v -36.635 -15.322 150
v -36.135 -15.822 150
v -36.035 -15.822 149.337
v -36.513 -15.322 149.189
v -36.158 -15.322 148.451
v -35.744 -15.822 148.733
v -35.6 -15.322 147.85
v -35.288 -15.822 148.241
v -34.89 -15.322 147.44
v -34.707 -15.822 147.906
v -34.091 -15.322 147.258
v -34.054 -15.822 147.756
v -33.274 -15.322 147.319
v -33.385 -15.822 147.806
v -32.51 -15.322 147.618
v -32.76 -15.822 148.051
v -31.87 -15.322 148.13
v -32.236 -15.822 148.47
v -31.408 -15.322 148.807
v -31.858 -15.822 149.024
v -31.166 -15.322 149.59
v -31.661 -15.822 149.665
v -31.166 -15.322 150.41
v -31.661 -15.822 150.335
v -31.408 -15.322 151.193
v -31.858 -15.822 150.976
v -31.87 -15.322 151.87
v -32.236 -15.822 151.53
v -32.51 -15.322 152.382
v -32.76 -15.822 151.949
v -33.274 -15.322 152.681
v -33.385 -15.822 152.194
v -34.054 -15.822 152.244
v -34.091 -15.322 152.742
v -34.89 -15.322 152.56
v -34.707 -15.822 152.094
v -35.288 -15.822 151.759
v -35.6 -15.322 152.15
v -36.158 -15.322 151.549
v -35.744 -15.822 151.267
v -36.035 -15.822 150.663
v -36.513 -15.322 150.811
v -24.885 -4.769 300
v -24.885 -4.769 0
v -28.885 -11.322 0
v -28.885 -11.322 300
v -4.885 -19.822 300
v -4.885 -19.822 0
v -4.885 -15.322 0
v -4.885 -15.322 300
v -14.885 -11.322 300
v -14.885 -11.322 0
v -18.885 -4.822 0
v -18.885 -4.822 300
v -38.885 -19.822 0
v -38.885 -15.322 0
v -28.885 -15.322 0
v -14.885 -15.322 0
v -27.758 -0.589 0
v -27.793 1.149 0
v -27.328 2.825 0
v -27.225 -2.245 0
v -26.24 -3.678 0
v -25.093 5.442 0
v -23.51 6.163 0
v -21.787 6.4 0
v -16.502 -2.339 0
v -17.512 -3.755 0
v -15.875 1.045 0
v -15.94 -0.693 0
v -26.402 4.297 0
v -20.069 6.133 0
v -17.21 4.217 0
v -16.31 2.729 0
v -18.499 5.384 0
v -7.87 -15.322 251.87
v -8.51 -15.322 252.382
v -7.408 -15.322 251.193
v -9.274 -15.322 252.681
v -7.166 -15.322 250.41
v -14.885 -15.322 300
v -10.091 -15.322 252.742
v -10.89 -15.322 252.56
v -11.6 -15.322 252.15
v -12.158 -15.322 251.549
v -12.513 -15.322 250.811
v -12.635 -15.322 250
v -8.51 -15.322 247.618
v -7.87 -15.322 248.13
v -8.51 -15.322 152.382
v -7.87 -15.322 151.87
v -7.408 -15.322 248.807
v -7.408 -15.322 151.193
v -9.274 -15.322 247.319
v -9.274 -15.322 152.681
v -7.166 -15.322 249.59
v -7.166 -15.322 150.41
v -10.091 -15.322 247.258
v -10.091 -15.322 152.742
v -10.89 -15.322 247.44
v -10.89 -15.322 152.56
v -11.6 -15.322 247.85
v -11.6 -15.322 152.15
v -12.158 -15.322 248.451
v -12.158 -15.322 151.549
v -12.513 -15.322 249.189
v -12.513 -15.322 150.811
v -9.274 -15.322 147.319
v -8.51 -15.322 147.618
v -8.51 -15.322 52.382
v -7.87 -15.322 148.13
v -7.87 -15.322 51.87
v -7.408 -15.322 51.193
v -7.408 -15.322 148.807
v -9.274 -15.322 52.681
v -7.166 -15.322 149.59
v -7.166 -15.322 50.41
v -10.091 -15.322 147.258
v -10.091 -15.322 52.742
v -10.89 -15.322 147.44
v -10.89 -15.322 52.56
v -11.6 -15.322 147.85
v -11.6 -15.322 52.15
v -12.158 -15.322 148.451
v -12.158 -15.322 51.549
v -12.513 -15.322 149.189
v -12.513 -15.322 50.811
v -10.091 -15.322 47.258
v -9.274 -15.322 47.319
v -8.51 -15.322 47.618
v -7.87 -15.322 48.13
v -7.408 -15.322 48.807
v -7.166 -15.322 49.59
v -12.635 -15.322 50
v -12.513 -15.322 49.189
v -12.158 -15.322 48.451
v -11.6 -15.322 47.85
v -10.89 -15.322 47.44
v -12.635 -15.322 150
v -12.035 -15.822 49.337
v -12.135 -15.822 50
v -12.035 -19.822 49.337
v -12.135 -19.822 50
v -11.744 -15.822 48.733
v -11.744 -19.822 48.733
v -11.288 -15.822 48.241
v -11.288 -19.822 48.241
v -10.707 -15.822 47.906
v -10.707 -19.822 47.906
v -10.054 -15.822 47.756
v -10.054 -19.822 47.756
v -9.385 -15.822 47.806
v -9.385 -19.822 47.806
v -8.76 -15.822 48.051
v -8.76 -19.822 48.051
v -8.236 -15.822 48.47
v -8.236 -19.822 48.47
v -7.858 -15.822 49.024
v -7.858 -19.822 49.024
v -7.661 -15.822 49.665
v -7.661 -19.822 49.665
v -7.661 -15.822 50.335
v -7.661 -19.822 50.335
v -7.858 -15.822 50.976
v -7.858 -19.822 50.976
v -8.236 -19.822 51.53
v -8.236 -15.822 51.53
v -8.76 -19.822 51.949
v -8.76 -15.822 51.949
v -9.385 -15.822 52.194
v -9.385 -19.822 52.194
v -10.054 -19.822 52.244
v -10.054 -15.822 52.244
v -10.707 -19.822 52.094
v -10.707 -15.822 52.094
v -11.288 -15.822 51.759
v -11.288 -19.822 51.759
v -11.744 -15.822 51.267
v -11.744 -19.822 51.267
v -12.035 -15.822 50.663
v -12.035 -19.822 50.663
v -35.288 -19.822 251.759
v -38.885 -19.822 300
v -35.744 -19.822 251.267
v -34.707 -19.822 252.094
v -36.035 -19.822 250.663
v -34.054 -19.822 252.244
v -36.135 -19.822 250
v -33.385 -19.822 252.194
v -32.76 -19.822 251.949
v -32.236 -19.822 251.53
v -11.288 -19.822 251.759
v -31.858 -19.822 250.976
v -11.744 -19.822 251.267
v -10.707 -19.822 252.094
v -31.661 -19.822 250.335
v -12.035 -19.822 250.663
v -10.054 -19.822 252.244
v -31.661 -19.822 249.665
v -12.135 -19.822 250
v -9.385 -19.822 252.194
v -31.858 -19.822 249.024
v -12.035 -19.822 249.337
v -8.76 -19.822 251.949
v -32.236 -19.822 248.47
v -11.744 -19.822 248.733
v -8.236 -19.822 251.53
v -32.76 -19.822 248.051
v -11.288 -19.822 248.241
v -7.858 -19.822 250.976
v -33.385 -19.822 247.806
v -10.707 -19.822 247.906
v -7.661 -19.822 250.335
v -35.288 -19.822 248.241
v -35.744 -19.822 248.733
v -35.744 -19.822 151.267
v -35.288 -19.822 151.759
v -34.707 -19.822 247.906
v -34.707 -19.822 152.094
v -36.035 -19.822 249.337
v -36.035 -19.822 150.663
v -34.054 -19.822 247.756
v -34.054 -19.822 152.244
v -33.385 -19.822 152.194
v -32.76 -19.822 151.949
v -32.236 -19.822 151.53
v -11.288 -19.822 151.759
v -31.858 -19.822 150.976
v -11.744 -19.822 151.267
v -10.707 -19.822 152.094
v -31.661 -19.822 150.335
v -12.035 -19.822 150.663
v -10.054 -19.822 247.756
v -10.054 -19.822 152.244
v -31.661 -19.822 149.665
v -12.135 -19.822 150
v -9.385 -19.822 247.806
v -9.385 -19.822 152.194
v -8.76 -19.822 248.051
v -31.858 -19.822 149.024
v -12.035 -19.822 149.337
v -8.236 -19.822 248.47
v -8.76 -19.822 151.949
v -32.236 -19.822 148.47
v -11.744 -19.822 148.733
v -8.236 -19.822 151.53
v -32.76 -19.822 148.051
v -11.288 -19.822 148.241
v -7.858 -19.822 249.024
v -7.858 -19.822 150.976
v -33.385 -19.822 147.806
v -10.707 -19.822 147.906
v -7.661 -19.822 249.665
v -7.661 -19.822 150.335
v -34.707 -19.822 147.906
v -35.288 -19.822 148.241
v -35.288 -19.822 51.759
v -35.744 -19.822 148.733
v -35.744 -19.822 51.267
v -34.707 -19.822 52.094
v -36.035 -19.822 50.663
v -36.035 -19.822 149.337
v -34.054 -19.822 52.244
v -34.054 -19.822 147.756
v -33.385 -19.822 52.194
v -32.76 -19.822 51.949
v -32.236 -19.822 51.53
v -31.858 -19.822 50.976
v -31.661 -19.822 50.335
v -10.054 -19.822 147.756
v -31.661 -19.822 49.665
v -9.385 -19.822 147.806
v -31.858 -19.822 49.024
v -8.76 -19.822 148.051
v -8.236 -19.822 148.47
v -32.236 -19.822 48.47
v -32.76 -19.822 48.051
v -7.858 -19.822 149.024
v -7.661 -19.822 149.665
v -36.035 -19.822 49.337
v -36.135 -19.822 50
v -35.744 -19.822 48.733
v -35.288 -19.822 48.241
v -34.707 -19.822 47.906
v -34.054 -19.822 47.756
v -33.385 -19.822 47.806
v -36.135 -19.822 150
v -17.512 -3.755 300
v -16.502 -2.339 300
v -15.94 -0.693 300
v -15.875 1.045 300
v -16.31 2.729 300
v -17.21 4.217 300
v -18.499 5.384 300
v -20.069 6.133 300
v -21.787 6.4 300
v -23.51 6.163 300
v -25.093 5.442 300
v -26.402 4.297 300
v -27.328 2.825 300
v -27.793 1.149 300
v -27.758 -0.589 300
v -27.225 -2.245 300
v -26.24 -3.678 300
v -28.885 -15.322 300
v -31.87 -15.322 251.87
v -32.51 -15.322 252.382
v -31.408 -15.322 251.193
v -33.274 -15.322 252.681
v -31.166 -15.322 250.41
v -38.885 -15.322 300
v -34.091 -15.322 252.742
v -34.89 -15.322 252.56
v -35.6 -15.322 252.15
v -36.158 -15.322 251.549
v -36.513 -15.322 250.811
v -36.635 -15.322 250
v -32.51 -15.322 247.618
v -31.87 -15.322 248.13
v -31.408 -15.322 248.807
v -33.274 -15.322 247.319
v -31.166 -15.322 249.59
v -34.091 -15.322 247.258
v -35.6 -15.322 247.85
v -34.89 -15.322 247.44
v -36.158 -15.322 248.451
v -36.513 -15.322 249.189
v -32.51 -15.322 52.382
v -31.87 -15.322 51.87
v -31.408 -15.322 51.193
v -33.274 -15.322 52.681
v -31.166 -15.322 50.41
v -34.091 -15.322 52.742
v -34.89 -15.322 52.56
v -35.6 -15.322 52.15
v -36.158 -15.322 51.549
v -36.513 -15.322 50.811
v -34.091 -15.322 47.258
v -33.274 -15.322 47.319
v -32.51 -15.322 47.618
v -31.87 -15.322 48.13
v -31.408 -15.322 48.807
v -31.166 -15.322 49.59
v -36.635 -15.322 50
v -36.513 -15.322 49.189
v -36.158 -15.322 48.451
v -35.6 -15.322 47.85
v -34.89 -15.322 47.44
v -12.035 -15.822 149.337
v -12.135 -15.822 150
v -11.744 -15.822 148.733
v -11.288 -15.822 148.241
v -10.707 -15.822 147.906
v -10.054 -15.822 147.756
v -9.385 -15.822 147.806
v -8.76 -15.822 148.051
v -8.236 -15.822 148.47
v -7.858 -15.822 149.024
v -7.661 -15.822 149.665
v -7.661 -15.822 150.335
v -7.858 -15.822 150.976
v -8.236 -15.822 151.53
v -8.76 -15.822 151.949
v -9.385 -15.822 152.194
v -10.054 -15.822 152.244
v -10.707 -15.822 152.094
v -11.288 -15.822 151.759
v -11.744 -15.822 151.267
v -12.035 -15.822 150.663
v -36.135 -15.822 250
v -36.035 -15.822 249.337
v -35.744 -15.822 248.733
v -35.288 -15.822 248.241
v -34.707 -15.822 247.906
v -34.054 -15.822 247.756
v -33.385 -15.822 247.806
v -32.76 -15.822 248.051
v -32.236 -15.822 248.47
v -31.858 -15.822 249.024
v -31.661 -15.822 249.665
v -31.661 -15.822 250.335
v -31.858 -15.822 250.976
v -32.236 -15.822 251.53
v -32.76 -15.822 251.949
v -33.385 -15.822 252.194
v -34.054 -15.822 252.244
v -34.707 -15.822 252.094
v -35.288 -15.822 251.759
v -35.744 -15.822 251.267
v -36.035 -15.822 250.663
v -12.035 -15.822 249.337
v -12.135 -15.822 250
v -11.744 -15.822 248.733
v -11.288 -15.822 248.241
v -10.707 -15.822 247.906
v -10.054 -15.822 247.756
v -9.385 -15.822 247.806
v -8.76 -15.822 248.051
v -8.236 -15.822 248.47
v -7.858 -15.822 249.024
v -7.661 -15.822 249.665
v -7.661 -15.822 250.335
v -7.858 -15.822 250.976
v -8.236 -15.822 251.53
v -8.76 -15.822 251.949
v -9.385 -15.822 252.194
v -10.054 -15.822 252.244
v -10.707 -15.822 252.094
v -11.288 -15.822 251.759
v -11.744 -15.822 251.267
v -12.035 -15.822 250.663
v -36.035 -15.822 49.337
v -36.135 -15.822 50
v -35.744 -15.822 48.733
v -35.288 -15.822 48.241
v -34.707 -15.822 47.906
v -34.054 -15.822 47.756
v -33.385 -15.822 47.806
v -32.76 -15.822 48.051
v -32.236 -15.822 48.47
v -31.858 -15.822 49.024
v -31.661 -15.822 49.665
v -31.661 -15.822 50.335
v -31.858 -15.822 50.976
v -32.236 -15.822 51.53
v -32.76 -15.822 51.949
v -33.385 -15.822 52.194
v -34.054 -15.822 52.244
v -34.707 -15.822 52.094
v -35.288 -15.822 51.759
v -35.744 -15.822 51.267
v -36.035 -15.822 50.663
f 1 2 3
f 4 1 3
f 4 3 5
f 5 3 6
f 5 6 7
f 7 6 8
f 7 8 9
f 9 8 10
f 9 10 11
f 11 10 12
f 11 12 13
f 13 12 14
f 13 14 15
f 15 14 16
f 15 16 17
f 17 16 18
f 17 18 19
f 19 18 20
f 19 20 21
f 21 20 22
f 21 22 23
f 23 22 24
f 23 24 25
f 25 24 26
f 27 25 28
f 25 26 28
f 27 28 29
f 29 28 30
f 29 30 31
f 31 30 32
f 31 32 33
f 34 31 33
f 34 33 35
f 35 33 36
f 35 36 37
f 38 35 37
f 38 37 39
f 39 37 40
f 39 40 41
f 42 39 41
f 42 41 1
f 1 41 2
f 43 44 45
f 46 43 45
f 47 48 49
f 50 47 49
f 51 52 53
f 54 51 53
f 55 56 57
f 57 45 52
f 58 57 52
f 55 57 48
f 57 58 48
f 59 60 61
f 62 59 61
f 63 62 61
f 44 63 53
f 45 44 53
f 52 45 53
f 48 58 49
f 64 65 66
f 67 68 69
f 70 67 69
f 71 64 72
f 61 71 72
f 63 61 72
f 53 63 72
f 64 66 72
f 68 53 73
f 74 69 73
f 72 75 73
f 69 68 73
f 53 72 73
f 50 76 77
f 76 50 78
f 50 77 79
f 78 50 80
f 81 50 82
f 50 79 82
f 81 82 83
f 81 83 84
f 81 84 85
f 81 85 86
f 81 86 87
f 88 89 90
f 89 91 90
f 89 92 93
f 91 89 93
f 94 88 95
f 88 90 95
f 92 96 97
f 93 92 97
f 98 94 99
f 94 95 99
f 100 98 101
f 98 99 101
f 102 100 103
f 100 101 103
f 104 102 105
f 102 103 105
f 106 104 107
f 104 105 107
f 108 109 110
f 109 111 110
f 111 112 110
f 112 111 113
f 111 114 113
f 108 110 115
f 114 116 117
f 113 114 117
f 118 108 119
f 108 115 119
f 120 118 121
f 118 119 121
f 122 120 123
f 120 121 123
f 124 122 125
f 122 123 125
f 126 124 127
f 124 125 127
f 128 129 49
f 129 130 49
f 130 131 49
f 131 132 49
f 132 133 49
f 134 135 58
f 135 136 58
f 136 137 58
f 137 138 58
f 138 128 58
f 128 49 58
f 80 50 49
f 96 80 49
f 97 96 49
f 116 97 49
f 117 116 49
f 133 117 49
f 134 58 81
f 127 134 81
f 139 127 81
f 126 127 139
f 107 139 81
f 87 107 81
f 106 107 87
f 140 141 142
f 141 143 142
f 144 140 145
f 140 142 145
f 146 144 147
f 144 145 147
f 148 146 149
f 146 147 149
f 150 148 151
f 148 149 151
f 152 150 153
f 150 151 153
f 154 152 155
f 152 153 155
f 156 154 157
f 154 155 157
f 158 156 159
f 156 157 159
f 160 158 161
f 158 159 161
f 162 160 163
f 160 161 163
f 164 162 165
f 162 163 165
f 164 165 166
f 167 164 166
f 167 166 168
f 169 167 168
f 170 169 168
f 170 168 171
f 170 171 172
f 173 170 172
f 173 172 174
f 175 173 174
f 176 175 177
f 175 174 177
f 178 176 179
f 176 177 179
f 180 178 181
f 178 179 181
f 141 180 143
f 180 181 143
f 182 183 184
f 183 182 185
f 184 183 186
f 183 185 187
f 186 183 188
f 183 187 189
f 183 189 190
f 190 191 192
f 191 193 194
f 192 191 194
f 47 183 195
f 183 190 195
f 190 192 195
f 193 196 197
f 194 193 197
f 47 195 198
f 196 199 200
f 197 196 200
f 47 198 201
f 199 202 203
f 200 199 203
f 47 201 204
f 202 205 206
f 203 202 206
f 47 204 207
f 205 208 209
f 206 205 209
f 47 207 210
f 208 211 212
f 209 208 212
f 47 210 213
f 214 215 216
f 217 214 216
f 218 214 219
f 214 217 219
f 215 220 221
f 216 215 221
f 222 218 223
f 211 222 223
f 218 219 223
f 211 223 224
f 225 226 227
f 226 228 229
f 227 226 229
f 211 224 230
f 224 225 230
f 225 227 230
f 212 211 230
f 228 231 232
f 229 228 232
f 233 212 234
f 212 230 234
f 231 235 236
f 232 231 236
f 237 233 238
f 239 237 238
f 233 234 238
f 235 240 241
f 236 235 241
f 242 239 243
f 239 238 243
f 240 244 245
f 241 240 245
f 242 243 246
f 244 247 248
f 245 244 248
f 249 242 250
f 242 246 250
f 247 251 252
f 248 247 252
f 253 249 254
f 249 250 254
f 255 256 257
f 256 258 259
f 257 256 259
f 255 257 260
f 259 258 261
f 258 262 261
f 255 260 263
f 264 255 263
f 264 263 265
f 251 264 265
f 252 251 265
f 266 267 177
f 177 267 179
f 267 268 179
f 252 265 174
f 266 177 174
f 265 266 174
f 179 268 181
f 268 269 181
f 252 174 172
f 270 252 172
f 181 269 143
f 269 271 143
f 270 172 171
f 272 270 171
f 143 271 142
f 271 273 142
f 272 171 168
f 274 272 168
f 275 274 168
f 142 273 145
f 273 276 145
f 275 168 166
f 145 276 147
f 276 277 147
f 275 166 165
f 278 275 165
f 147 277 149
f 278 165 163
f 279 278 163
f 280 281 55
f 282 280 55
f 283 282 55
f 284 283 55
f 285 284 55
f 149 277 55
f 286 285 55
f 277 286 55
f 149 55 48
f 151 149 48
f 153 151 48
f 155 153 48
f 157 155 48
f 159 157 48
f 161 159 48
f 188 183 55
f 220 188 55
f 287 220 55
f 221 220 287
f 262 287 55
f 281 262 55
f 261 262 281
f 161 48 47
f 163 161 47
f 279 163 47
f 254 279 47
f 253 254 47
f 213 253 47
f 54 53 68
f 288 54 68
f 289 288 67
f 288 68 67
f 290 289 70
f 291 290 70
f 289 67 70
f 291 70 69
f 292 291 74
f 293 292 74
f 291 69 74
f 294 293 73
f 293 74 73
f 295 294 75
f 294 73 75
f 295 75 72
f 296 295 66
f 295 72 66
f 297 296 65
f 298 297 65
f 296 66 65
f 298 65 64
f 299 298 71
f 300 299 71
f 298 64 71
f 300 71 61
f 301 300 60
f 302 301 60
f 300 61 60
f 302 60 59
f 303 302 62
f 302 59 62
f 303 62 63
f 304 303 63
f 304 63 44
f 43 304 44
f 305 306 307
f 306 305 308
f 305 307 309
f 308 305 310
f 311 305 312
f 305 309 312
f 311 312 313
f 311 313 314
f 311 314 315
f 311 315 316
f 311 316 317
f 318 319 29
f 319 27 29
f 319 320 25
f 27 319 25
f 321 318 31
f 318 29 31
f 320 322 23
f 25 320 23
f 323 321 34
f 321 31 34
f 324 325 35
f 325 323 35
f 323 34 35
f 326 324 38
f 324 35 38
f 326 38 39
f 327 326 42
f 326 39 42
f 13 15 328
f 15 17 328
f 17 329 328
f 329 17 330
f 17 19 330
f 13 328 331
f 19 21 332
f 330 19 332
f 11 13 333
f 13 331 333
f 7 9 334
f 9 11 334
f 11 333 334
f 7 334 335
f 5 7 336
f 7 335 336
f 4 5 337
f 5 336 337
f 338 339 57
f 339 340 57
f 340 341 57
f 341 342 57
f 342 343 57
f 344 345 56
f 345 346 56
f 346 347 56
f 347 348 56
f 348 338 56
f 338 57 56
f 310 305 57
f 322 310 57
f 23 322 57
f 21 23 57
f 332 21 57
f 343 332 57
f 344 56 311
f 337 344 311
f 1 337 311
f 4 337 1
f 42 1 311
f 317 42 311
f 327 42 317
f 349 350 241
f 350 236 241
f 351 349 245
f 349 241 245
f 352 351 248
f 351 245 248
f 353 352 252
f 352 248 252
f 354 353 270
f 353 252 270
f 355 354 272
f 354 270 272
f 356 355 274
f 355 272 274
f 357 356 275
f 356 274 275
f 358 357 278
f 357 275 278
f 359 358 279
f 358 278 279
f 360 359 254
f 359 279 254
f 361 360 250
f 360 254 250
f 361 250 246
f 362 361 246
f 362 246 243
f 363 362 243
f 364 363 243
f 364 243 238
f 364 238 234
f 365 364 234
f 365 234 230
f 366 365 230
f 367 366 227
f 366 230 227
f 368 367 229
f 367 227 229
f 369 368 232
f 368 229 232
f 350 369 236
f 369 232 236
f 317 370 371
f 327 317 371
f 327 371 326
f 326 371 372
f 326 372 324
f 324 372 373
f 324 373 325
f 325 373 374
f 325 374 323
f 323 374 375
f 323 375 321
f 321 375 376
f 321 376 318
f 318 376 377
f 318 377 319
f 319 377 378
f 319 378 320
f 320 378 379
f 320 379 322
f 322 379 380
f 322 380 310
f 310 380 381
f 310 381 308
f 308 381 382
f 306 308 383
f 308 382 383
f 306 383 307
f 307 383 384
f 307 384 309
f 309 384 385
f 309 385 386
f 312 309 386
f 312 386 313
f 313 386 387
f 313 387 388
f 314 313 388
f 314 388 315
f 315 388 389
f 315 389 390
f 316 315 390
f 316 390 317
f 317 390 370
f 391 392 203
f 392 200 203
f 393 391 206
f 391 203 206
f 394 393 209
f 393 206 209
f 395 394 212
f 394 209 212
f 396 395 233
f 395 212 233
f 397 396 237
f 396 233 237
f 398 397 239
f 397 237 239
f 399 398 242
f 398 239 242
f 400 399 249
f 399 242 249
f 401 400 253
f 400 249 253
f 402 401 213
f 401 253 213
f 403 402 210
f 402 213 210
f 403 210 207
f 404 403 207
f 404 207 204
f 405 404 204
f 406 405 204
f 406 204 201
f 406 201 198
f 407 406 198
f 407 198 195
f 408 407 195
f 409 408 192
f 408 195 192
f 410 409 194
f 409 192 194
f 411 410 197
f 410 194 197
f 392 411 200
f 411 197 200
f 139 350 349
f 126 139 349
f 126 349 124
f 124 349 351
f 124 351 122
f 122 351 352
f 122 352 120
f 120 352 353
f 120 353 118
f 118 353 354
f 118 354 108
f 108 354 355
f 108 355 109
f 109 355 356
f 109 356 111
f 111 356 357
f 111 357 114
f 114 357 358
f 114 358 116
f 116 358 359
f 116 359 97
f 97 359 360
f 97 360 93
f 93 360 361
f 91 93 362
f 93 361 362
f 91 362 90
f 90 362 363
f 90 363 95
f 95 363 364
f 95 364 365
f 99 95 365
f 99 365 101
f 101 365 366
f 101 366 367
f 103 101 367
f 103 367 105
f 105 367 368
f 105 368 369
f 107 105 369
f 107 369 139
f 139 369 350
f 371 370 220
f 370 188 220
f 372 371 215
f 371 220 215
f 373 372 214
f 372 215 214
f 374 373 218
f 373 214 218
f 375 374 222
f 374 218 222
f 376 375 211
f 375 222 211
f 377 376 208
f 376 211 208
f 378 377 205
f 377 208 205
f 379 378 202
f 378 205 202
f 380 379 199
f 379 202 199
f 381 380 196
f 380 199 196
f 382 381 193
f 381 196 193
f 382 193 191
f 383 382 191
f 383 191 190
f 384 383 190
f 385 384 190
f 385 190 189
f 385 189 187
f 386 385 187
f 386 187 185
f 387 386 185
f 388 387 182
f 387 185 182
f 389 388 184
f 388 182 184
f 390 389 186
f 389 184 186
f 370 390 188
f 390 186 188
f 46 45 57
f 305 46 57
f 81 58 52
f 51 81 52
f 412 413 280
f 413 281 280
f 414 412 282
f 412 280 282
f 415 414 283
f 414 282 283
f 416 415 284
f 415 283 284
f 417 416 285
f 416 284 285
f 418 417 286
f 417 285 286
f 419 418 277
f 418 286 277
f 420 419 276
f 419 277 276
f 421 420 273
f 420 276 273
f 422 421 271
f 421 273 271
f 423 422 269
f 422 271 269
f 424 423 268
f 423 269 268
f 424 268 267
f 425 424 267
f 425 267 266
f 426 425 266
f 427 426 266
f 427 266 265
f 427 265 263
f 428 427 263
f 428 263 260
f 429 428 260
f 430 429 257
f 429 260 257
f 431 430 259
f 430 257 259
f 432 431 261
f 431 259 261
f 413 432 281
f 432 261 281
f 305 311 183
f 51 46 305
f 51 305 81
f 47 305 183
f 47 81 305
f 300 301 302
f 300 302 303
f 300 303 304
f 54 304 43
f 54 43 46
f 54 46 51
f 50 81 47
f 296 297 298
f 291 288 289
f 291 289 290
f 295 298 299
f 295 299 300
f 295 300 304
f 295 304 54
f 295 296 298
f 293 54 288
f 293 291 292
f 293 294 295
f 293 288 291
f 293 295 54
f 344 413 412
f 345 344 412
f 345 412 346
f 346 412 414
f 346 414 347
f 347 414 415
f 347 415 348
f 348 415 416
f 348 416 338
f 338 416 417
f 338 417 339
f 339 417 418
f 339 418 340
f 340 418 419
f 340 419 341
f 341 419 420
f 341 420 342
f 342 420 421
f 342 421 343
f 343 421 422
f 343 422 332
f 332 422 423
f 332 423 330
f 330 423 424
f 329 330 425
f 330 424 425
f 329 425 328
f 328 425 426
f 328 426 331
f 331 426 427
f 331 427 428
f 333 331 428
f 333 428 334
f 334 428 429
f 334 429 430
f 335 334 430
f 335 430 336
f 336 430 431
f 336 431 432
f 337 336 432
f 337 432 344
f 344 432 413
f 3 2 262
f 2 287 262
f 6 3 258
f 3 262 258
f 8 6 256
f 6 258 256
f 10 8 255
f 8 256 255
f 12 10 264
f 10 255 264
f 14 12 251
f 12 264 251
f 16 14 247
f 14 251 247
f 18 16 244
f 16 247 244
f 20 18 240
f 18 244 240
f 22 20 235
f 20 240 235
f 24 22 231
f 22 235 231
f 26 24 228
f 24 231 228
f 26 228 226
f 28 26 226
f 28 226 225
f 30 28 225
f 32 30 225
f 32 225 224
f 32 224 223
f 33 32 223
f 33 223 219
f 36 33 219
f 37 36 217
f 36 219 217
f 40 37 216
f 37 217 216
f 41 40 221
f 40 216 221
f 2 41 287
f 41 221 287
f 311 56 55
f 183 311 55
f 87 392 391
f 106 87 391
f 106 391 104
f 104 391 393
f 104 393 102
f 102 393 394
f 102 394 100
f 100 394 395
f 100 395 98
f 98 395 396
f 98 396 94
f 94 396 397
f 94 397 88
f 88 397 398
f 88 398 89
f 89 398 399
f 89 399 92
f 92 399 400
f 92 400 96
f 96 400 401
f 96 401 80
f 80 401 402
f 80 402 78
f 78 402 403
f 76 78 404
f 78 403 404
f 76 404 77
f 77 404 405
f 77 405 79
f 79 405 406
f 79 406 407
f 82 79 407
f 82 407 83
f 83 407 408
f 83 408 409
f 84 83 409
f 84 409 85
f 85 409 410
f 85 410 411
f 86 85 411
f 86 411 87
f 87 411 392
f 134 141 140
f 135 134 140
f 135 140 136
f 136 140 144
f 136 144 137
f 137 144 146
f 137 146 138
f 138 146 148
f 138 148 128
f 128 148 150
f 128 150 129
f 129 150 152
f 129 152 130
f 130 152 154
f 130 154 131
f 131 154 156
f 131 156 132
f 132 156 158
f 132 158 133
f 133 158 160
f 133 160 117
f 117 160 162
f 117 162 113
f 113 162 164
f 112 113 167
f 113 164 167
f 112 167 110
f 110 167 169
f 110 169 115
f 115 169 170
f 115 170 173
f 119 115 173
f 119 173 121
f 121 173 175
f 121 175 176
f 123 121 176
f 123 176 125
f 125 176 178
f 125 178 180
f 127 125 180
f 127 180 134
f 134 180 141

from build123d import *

# Parameters (mm, degrees)
EXTRUSION1_DEPTH                               = 300
FRAISAGE_POUR_VIS_T_TE_FRAIS_E_M41_D           = 4.5
FRAISAGE_POUR_VIS_T_TE_FRAIS_E_M41_CSINK_D     = 5.5
FRAISAGE_POUR_VIS_T_TE_FRAIS_E_M41_CSINK_ANGLE = 90


with BuildPart() as part:
    # Esquisse1 → Extrusion1 (new body)
    with BuildSketch(Plane.XY):
        with BuildLine():
            Line((-38.885451278, -19.821642953), (-4.885451278, -19.821642953))
            Line((-4.885451278, -19.821642953), (-4.885451278, -15.321642953))
            Line((-4.885451278, -15.321642953), (-14.885451278, -15.321642953))
            Line((-14.885451278, -15.321642953), (-14.885451278, -11.321642953))
            Line((-14.885451278, -11.321642953), (-18.885451278, -4.821642953))
            ThreePointArc((-18.885451278, -4.821642953), (-21.78726352, 6.400322803), (-24.885451278, -4.769021956))
            Line((-24.885451278, -4.769021956), (-28.885451278, -11.321642953))
            Line((-28.885451278, -11.321642953), (-28.885451278, -15.321642953))
            Line((-28.885451278, -15.321642953), (-38.885451278, -15.321642953))
            Line((-38.885451278, -15.321642953), (-38.885451278, -19.821642953))
        make_face()
    extrude(amount=EXTRUSION1_DEPTH)

    # Fraisage pour vis à tête fraisée M41 (through all)
    with Locations(Plane(origin=(-33.885451278, -15.321642953, 50), x_dir=(1, 0, 0), z_dir=(0, 1, 0))):
        with Locations((0, 0), (0, -100), (0, -200), (24, -200), (24, -100), (24, 0)):
            CounterSinkHole(FRAISAGE_POUR_VIS_T_TE_FRAIS_E_M41_D / 2, FRAISAGE_POUR_VIS_T_TE_FRAIS_E_M41_CSINK_D / 2, counter_sink_angle=FRAISAGE_POUR_VIS_T_TE_FRAIS_E_M41_CSINK_ANGLE)


solid = part.part
